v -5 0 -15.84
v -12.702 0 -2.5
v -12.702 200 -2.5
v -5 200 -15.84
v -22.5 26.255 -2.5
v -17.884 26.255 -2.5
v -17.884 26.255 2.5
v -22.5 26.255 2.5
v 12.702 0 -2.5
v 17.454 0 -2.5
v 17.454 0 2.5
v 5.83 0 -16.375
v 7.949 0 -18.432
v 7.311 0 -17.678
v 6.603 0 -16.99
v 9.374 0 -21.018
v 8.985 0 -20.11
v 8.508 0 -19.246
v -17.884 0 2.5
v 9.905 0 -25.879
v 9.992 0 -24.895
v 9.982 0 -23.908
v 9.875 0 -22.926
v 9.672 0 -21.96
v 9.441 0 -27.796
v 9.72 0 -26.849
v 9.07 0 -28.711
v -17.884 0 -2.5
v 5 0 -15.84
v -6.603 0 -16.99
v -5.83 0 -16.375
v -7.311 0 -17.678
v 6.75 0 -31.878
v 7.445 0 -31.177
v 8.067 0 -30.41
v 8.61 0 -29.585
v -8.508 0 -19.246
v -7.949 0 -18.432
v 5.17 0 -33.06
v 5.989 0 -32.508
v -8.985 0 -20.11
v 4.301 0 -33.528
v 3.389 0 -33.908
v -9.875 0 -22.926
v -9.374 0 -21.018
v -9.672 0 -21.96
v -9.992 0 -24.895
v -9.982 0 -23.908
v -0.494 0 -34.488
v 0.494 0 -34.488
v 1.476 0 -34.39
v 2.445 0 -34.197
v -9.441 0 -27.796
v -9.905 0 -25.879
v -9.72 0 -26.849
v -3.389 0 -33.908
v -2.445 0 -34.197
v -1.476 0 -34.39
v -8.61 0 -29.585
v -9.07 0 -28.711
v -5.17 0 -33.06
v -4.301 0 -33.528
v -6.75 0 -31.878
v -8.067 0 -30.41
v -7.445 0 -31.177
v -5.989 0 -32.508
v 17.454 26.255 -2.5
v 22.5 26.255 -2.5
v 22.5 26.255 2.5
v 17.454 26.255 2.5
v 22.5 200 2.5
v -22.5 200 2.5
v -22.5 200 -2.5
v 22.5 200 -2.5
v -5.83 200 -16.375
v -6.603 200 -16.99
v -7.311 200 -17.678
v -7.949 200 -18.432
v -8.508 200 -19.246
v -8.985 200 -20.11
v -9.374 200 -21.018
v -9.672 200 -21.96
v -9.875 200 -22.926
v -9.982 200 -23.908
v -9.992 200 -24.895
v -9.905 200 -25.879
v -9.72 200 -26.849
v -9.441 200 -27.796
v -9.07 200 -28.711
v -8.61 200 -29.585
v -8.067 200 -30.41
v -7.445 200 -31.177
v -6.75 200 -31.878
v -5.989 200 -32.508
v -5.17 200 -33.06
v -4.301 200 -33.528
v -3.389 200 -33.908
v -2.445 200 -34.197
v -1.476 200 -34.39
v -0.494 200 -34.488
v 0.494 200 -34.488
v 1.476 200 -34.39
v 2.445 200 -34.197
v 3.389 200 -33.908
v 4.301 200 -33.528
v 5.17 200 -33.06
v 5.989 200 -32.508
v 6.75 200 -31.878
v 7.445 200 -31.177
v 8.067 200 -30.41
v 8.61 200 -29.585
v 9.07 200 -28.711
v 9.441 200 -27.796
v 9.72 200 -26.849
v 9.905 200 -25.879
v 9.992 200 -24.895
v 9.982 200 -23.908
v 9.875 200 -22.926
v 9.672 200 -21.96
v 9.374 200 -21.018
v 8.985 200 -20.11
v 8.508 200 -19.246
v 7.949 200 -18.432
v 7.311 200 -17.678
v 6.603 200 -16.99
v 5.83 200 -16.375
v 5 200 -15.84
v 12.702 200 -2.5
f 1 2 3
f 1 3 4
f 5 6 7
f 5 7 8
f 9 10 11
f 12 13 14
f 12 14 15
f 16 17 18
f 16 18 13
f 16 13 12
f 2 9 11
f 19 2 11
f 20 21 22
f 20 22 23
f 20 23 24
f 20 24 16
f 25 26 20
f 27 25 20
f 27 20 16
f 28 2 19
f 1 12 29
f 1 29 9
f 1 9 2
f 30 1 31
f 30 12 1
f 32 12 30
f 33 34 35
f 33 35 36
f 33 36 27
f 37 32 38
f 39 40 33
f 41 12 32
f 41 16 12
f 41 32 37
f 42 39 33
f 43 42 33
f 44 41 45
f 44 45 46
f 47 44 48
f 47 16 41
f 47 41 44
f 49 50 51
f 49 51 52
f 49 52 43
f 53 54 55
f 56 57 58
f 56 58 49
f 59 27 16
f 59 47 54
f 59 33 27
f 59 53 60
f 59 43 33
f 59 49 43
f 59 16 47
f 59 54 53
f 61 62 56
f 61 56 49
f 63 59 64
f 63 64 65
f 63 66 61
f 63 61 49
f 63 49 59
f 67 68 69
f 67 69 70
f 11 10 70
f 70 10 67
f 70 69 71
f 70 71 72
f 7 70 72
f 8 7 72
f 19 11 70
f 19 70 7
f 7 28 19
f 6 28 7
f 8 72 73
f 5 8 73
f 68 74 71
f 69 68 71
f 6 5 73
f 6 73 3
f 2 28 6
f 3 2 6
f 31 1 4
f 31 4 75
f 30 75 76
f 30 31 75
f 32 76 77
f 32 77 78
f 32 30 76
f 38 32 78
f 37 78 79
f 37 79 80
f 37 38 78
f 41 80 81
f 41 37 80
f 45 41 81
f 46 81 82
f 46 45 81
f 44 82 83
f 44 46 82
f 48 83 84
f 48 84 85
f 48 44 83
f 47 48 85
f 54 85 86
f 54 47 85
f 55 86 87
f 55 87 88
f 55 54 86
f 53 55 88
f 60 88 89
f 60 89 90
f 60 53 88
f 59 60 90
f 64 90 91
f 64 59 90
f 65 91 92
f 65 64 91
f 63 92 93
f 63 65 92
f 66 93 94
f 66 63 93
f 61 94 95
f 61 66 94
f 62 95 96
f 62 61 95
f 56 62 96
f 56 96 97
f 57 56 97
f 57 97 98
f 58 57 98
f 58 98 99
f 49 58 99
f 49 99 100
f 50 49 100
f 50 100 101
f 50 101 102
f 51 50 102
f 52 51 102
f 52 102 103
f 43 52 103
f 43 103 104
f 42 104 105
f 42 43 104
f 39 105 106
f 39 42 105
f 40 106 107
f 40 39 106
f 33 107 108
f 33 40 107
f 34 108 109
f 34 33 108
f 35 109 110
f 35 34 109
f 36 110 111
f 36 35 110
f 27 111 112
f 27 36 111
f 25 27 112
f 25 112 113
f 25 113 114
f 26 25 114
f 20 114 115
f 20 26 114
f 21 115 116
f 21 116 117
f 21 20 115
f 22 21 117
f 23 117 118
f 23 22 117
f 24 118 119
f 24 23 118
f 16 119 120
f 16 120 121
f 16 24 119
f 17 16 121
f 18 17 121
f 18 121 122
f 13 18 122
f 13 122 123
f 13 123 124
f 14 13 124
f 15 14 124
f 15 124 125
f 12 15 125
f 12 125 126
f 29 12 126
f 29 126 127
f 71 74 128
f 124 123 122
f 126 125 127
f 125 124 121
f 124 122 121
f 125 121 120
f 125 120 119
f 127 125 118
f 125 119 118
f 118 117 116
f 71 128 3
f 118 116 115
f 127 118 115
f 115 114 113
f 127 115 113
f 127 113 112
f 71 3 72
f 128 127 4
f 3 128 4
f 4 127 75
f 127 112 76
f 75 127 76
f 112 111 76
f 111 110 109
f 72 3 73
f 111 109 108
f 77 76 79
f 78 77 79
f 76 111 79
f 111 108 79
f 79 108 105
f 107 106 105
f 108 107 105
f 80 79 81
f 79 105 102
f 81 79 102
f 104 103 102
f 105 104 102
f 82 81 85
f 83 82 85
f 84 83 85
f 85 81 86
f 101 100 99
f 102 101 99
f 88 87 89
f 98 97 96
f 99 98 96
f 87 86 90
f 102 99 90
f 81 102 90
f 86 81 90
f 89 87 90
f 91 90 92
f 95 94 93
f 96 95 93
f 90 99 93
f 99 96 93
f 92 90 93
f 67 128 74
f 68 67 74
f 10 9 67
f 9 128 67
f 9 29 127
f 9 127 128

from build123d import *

# Parameters (mm, degrees)
BOSS_EXTRUDE1_DEPTH = 200
SKETCH2_W           = 9.23188111
SKETCH2_H           = 28.936228776
SKETCH2_W_2         = 10.092838874
CUT_EXTRUDE1_DEPTH  = 6


with BuildPart() as part:
    # Sketch1 → Boss-Extrude1 (new body)
    with BuildSketch(Plane(origin=(0, 0, 0), x_dir=(1, 0, 0), z_dir=(0, 1, 0))):
        with BuildLine():
            Line((22.5, -2.5), (-22.5, -2.5))
            Line((-22.5, -2.5), (-22.5, 2.5))
            Line((-22.5, 2.5), (-12.701705922, 2.5))
            Line((-12.701705922, 2.5), (-5, 15.839745962))
            ThreePointArc((-5, 15.839745962), (0, 34.5), (5, 15.839745962))
            Line((5, 15.839745962), (12.701705922, 2.5))
            Line((12.701705922, 2.5), (22.5, 2.5))
            Line((22.5, 2.5), (22.5, -2.5))
        make_face()
    extrude(amount=BOSS_EXTRUDE1_DEPTH)

    # Sketch2 → Cut-Extrude1 (cut, through all)
    with BuildSketch(Plane(origin=(0, 0, -2.5), x_dir=(-1, 0, 0), z_dir=(0, 0, -1))):
        with Locations((22.5, 11.786741845)):
            Rectangle(SKETCH2_W, SKETCH2_H)
        with Locations((-22.5, 11.786741845)):
            Rectangle(SKETCH2_W_2, SKETCH2_H)
    extrude(amount=-CUT_EXTRUDE1_DEPTH, mode=Mode.SUBTRACT)


solid = part.part
